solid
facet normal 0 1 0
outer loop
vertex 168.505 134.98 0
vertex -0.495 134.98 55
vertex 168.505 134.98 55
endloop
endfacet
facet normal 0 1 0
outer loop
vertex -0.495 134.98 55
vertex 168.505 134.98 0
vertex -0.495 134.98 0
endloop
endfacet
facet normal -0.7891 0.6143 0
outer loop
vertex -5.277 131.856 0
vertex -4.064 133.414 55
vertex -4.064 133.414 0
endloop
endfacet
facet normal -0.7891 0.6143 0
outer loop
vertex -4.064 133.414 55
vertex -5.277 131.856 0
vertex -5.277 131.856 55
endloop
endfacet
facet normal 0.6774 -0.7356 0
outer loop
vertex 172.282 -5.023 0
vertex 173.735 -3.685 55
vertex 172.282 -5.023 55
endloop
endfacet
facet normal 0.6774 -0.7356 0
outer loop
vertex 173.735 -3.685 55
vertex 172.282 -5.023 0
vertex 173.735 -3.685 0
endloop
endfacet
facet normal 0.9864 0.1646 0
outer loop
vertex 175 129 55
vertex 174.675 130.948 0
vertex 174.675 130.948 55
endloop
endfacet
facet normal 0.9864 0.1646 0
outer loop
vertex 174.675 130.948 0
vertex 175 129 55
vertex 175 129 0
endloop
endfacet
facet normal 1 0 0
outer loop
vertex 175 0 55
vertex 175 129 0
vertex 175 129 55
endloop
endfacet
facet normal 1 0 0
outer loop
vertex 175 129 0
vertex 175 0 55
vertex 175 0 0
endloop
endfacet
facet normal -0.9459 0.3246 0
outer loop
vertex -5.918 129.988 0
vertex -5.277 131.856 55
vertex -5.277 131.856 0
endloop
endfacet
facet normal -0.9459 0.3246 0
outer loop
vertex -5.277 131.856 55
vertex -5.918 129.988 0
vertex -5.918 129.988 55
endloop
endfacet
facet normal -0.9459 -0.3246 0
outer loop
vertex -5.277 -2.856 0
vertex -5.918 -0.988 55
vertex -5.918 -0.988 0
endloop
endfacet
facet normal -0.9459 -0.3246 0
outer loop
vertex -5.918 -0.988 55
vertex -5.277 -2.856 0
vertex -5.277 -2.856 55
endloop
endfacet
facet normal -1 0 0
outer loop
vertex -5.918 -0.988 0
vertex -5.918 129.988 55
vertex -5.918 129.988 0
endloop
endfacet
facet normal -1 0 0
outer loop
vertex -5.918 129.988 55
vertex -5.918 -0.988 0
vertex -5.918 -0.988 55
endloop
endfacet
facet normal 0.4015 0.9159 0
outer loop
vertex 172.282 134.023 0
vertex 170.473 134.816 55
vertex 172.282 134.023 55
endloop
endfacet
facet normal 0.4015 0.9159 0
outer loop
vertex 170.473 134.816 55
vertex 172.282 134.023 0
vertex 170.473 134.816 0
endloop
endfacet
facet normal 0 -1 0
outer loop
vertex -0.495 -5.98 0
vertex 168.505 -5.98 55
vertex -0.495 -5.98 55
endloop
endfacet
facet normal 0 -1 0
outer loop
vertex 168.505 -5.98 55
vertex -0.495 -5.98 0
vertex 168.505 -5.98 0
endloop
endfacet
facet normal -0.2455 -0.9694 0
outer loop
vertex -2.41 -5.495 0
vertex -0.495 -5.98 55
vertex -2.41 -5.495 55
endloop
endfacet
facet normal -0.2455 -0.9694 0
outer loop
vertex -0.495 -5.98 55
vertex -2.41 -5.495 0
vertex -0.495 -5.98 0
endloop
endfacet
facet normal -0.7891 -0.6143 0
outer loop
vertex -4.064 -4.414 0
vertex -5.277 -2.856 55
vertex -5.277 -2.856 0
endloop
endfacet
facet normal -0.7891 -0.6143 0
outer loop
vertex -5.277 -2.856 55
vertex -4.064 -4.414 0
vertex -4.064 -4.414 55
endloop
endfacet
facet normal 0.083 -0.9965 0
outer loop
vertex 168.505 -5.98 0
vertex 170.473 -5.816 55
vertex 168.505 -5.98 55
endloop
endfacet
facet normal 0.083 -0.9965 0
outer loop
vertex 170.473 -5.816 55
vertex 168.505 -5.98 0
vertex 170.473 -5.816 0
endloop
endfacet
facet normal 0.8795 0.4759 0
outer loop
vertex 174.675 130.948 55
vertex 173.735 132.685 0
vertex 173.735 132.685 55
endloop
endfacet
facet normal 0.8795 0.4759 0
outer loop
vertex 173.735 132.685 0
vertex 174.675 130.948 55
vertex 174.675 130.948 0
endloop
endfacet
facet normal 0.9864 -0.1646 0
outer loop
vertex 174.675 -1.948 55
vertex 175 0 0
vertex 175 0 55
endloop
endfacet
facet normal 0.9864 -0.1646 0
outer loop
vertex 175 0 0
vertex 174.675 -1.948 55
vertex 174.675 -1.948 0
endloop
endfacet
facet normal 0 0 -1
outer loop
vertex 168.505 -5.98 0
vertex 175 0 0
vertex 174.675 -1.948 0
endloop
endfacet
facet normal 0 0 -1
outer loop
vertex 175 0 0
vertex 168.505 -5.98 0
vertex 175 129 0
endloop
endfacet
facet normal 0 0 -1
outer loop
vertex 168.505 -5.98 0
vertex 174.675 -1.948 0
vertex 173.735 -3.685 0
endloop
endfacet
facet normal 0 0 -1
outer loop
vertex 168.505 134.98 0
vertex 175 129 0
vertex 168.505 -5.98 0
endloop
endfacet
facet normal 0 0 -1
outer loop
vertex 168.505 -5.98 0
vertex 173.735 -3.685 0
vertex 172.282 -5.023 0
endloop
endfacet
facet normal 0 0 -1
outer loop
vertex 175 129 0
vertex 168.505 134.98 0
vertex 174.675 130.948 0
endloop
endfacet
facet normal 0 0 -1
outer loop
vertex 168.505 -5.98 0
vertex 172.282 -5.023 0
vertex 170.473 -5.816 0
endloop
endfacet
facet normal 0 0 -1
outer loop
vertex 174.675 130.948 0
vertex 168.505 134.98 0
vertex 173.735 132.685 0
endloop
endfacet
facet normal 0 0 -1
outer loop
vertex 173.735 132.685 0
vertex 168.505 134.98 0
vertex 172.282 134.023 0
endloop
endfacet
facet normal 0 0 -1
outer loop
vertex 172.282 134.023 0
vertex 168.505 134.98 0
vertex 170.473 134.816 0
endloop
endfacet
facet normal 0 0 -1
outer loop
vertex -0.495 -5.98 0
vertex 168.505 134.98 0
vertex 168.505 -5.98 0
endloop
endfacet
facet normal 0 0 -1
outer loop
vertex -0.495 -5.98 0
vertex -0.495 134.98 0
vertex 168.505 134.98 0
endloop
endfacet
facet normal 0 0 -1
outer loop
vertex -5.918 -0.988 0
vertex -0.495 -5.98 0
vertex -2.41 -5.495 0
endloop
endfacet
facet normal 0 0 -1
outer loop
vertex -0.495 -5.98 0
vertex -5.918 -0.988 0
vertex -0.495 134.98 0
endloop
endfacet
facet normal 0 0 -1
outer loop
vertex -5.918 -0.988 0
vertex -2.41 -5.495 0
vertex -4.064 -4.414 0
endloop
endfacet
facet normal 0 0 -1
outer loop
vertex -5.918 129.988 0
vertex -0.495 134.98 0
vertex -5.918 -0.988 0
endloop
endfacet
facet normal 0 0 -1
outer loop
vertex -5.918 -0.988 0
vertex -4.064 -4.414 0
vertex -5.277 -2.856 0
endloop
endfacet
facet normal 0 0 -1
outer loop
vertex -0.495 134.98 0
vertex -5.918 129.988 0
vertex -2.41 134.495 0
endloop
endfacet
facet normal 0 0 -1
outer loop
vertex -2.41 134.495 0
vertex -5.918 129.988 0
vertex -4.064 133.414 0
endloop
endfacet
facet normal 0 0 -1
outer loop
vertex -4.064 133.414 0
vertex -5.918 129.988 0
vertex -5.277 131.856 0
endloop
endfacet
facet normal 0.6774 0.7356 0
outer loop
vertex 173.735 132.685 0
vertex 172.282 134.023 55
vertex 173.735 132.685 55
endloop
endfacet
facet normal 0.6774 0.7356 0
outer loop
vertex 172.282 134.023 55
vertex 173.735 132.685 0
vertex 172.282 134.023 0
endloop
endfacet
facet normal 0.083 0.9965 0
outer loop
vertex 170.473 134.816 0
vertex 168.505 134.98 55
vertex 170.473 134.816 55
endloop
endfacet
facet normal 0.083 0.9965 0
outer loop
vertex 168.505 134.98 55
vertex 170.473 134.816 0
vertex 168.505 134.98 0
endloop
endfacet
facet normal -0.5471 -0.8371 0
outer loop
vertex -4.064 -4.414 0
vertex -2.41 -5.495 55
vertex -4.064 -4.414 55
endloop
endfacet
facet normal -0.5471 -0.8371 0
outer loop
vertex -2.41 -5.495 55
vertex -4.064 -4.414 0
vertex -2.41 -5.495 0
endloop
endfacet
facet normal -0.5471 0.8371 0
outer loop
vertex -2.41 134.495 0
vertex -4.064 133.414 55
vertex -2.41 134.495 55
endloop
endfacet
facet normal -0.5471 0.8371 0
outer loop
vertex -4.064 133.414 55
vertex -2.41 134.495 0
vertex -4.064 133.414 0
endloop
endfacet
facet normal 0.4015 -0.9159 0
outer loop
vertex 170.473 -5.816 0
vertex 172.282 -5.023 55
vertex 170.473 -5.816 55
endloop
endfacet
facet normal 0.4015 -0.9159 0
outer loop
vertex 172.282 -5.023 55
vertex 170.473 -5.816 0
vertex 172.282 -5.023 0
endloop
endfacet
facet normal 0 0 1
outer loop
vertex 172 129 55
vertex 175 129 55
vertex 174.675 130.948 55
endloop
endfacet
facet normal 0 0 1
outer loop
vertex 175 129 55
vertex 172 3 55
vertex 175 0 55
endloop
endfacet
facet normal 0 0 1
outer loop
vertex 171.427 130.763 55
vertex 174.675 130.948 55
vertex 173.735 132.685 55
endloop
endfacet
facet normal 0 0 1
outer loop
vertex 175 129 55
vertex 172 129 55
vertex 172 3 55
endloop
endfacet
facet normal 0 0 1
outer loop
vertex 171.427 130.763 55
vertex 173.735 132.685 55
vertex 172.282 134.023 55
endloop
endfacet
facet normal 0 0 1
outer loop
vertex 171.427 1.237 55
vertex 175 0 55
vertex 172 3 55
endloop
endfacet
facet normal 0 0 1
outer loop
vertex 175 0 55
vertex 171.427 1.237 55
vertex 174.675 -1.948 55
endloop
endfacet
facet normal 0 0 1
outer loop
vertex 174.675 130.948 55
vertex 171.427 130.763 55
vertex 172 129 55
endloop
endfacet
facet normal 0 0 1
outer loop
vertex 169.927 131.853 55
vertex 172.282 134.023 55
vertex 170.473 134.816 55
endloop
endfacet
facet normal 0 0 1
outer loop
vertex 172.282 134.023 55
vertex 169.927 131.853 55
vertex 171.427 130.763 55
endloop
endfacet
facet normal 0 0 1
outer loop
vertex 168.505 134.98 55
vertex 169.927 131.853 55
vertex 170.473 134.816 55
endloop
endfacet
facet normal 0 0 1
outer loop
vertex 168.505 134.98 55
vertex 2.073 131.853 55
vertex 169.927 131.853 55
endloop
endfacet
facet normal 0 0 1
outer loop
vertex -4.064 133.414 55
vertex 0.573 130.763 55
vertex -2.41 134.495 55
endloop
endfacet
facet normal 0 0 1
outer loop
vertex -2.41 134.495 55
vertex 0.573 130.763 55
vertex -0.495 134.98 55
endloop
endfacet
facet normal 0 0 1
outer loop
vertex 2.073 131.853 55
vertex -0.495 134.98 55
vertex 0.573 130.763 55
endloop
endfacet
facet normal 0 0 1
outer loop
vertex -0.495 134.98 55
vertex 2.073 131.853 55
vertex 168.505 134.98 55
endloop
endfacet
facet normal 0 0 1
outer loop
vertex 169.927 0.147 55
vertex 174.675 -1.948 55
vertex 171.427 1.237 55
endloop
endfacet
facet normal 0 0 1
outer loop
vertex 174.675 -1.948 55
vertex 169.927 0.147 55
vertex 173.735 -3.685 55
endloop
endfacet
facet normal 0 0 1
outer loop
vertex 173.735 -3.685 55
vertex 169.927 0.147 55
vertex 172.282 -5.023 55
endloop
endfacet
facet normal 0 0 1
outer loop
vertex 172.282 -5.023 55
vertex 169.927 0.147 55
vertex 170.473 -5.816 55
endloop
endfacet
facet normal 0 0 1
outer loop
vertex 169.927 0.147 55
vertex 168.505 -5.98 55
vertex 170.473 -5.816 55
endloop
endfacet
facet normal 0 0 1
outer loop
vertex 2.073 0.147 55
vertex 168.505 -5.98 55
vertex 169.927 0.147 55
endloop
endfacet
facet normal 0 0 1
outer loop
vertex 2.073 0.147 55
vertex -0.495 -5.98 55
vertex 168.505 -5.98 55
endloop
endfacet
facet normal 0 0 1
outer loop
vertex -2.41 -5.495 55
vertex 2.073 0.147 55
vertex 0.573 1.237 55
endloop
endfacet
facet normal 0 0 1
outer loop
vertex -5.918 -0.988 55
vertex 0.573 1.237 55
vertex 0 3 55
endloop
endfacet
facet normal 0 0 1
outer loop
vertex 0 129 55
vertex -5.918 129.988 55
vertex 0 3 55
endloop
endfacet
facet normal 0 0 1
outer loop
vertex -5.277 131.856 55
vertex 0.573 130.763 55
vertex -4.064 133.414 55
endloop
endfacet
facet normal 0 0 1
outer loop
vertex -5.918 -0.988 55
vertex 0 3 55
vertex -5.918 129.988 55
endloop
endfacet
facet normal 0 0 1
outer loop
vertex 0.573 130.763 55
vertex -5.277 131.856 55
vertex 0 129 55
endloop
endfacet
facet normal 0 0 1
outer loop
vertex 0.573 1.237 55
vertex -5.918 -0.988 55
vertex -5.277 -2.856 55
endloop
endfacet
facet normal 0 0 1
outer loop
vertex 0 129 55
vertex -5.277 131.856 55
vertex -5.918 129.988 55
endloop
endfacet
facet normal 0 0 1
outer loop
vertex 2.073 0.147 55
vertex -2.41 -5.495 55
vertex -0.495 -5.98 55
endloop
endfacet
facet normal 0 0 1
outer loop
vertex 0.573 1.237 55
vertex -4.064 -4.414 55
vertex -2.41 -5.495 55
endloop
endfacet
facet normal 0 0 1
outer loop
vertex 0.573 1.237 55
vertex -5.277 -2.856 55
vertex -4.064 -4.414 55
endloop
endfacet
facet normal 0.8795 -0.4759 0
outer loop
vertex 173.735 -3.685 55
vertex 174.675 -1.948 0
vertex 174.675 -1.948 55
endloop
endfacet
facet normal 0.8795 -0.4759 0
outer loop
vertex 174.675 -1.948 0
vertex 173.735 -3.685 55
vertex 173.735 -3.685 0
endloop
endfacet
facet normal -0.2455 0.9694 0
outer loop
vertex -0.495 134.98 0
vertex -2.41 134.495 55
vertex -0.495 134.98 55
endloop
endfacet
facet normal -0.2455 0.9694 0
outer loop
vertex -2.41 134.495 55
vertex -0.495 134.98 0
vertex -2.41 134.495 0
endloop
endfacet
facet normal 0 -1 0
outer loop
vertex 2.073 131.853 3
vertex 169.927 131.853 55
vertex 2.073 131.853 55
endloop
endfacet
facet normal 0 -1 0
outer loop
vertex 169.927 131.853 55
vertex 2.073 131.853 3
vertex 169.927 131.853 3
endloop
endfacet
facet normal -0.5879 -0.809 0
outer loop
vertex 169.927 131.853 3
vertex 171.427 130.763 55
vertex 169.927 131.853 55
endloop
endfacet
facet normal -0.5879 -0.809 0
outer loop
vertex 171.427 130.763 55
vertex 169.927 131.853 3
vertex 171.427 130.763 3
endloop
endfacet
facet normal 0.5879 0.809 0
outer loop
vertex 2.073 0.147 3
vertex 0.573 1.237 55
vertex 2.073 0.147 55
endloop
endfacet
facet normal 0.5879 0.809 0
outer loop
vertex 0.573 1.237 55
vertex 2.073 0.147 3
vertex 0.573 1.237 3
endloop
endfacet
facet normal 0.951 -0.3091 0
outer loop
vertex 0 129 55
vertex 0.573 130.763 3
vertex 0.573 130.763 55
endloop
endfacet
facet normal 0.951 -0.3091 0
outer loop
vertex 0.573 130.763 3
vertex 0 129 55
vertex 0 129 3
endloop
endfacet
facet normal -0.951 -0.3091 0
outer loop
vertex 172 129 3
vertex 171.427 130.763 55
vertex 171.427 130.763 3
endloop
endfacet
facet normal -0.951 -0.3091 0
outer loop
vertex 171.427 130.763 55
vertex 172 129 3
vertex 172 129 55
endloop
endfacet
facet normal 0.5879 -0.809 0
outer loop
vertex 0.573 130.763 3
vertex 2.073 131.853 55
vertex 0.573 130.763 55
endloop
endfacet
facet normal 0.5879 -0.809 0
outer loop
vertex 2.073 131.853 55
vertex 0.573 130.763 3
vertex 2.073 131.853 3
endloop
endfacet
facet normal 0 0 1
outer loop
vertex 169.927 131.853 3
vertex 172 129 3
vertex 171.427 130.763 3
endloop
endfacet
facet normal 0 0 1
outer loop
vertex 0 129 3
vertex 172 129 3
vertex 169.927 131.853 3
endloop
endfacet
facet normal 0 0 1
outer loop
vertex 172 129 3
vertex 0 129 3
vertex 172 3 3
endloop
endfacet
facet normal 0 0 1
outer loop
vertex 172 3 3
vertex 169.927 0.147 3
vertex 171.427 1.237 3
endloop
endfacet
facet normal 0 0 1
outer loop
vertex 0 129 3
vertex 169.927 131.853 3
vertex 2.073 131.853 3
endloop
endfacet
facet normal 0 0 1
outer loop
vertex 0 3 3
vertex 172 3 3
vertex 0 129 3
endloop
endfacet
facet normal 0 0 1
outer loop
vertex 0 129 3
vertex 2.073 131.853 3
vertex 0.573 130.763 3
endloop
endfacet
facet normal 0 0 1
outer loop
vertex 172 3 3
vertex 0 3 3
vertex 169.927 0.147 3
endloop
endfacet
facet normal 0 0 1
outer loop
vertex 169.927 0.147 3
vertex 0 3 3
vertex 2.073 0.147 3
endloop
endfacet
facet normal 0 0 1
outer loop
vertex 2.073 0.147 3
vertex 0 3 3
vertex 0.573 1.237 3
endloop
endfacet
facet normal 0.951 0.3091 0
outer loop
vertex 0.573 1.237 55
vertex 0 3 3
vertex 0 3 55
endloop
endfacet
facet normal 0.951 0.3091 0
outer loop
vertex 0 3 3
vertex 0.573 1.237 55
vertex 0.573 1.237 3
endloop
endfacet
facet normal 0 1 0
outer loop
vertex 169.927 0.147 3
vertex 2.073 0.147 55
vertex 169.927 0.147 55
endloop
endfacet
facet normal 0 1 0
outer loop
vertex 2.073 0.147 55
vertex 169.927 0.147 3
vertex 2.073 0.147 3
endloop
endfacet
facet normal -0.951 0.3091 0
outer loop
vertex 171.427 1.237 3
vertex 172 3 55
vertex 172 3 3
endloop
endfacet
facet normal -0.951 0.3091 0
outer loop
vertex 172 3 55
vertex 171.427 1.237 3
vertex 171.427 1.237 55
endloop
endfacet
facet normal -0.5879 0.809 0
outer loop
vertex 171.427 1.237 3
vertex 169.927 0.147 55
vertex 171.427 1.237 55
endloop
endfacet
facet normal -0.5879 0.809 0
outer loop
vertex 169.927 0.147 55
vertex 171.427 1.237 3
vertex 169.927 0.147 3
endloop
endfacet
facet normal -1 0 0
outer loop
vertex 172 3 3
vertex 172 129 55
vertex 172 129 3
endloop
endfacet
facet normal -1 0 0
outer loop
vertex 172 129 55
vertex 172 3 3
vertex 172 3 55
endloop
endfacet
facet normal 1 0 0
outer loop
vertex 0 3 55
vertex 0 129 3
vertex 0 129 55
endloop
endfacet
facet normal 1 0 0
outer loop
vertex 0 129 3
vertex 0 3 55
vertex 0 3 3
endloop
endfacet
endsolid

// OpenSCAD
// Seeding tray (6-cell kit) — REFERENCE MOCKUP (non-printable).
//
// Classification: reference_only (mockups playbook). NOT in parts.json.
// Approximates the 6-cell kit's seeding tray / cove / base per marketing
// dimensions.
//
// Source: kit marketing figures recorded 2026-09-17 (journal + session notes):
//   seeding tray  6.9 x 5.3 x 2.2 in  (175 x 135 x 55 mm)
//   clear cove    7.25 x 5.8 x 3.9 in (185 x 145 x 100 mm)
//   base          7.25 x 5.7 x 2.3 in (185 x 145 x 56 mm)
// UNCERTAINTY: marketing/retail figures, not measured. Placeholder geometry
// only — do NOT treat as a functional interface.

seed_tray_6_l = is_undef(seed_tray_6_l) ? 175.0 : seed_tray_6_l;
seed_tray_6_w = is_undef(seed_tray_6_w) ? 135.0 : seed_tray_6_w;
seed_tray_6_h = is_undef(seed_tray_6_h) ? 55.0  : seed_tray_6_h;
seed_tray_6_wall = is_undef(seed_tray_6_wall) ? 3.0 : seed_tray_6_wall;
seed_tray_6_corner = is_undef(seed_tray_6_corner) ? 6.0 : seed_tray_6_corner;

module _rounded_box_6(L, W, H, r) {
    r = min(r, min(L, W) / 2);
    hull() {
        cylinder(h = H, r = r);
        translate([L - r, 0, 0]) cylinder(h = H, r = r);
        translate([L - r, W - r, 0]) cylinder(h = H, r = r);
        translate([0, W - r, 0]) cylinder(h = H, r = r);
    }
}

// Open-topped seeding tray (placeholder; 3 x 2 cell grid is implied, not modeled).
module plug_tray_6cell() {
    difference() {
        _rounded_box_6(seed_tray_6_l, seed_tray_6_w, seed_tray_6_h, seed_tray_6_corner);
        translate([seed_tray_6_wall, seed_tray_6_wall, seed_tray_6_wall])
            _rounded_box_6(
                seed_tray_6_l - 2 * seed_tray_6_wall,
                seed_tray_6_w - 2 * seed_tray_6_wall,
                seed_tray_6_h + 1,
                max(seed_tray_6_corner - seed_tray_6_wall, 0.1)
            );
    }
}

plug_tray_6cell();
